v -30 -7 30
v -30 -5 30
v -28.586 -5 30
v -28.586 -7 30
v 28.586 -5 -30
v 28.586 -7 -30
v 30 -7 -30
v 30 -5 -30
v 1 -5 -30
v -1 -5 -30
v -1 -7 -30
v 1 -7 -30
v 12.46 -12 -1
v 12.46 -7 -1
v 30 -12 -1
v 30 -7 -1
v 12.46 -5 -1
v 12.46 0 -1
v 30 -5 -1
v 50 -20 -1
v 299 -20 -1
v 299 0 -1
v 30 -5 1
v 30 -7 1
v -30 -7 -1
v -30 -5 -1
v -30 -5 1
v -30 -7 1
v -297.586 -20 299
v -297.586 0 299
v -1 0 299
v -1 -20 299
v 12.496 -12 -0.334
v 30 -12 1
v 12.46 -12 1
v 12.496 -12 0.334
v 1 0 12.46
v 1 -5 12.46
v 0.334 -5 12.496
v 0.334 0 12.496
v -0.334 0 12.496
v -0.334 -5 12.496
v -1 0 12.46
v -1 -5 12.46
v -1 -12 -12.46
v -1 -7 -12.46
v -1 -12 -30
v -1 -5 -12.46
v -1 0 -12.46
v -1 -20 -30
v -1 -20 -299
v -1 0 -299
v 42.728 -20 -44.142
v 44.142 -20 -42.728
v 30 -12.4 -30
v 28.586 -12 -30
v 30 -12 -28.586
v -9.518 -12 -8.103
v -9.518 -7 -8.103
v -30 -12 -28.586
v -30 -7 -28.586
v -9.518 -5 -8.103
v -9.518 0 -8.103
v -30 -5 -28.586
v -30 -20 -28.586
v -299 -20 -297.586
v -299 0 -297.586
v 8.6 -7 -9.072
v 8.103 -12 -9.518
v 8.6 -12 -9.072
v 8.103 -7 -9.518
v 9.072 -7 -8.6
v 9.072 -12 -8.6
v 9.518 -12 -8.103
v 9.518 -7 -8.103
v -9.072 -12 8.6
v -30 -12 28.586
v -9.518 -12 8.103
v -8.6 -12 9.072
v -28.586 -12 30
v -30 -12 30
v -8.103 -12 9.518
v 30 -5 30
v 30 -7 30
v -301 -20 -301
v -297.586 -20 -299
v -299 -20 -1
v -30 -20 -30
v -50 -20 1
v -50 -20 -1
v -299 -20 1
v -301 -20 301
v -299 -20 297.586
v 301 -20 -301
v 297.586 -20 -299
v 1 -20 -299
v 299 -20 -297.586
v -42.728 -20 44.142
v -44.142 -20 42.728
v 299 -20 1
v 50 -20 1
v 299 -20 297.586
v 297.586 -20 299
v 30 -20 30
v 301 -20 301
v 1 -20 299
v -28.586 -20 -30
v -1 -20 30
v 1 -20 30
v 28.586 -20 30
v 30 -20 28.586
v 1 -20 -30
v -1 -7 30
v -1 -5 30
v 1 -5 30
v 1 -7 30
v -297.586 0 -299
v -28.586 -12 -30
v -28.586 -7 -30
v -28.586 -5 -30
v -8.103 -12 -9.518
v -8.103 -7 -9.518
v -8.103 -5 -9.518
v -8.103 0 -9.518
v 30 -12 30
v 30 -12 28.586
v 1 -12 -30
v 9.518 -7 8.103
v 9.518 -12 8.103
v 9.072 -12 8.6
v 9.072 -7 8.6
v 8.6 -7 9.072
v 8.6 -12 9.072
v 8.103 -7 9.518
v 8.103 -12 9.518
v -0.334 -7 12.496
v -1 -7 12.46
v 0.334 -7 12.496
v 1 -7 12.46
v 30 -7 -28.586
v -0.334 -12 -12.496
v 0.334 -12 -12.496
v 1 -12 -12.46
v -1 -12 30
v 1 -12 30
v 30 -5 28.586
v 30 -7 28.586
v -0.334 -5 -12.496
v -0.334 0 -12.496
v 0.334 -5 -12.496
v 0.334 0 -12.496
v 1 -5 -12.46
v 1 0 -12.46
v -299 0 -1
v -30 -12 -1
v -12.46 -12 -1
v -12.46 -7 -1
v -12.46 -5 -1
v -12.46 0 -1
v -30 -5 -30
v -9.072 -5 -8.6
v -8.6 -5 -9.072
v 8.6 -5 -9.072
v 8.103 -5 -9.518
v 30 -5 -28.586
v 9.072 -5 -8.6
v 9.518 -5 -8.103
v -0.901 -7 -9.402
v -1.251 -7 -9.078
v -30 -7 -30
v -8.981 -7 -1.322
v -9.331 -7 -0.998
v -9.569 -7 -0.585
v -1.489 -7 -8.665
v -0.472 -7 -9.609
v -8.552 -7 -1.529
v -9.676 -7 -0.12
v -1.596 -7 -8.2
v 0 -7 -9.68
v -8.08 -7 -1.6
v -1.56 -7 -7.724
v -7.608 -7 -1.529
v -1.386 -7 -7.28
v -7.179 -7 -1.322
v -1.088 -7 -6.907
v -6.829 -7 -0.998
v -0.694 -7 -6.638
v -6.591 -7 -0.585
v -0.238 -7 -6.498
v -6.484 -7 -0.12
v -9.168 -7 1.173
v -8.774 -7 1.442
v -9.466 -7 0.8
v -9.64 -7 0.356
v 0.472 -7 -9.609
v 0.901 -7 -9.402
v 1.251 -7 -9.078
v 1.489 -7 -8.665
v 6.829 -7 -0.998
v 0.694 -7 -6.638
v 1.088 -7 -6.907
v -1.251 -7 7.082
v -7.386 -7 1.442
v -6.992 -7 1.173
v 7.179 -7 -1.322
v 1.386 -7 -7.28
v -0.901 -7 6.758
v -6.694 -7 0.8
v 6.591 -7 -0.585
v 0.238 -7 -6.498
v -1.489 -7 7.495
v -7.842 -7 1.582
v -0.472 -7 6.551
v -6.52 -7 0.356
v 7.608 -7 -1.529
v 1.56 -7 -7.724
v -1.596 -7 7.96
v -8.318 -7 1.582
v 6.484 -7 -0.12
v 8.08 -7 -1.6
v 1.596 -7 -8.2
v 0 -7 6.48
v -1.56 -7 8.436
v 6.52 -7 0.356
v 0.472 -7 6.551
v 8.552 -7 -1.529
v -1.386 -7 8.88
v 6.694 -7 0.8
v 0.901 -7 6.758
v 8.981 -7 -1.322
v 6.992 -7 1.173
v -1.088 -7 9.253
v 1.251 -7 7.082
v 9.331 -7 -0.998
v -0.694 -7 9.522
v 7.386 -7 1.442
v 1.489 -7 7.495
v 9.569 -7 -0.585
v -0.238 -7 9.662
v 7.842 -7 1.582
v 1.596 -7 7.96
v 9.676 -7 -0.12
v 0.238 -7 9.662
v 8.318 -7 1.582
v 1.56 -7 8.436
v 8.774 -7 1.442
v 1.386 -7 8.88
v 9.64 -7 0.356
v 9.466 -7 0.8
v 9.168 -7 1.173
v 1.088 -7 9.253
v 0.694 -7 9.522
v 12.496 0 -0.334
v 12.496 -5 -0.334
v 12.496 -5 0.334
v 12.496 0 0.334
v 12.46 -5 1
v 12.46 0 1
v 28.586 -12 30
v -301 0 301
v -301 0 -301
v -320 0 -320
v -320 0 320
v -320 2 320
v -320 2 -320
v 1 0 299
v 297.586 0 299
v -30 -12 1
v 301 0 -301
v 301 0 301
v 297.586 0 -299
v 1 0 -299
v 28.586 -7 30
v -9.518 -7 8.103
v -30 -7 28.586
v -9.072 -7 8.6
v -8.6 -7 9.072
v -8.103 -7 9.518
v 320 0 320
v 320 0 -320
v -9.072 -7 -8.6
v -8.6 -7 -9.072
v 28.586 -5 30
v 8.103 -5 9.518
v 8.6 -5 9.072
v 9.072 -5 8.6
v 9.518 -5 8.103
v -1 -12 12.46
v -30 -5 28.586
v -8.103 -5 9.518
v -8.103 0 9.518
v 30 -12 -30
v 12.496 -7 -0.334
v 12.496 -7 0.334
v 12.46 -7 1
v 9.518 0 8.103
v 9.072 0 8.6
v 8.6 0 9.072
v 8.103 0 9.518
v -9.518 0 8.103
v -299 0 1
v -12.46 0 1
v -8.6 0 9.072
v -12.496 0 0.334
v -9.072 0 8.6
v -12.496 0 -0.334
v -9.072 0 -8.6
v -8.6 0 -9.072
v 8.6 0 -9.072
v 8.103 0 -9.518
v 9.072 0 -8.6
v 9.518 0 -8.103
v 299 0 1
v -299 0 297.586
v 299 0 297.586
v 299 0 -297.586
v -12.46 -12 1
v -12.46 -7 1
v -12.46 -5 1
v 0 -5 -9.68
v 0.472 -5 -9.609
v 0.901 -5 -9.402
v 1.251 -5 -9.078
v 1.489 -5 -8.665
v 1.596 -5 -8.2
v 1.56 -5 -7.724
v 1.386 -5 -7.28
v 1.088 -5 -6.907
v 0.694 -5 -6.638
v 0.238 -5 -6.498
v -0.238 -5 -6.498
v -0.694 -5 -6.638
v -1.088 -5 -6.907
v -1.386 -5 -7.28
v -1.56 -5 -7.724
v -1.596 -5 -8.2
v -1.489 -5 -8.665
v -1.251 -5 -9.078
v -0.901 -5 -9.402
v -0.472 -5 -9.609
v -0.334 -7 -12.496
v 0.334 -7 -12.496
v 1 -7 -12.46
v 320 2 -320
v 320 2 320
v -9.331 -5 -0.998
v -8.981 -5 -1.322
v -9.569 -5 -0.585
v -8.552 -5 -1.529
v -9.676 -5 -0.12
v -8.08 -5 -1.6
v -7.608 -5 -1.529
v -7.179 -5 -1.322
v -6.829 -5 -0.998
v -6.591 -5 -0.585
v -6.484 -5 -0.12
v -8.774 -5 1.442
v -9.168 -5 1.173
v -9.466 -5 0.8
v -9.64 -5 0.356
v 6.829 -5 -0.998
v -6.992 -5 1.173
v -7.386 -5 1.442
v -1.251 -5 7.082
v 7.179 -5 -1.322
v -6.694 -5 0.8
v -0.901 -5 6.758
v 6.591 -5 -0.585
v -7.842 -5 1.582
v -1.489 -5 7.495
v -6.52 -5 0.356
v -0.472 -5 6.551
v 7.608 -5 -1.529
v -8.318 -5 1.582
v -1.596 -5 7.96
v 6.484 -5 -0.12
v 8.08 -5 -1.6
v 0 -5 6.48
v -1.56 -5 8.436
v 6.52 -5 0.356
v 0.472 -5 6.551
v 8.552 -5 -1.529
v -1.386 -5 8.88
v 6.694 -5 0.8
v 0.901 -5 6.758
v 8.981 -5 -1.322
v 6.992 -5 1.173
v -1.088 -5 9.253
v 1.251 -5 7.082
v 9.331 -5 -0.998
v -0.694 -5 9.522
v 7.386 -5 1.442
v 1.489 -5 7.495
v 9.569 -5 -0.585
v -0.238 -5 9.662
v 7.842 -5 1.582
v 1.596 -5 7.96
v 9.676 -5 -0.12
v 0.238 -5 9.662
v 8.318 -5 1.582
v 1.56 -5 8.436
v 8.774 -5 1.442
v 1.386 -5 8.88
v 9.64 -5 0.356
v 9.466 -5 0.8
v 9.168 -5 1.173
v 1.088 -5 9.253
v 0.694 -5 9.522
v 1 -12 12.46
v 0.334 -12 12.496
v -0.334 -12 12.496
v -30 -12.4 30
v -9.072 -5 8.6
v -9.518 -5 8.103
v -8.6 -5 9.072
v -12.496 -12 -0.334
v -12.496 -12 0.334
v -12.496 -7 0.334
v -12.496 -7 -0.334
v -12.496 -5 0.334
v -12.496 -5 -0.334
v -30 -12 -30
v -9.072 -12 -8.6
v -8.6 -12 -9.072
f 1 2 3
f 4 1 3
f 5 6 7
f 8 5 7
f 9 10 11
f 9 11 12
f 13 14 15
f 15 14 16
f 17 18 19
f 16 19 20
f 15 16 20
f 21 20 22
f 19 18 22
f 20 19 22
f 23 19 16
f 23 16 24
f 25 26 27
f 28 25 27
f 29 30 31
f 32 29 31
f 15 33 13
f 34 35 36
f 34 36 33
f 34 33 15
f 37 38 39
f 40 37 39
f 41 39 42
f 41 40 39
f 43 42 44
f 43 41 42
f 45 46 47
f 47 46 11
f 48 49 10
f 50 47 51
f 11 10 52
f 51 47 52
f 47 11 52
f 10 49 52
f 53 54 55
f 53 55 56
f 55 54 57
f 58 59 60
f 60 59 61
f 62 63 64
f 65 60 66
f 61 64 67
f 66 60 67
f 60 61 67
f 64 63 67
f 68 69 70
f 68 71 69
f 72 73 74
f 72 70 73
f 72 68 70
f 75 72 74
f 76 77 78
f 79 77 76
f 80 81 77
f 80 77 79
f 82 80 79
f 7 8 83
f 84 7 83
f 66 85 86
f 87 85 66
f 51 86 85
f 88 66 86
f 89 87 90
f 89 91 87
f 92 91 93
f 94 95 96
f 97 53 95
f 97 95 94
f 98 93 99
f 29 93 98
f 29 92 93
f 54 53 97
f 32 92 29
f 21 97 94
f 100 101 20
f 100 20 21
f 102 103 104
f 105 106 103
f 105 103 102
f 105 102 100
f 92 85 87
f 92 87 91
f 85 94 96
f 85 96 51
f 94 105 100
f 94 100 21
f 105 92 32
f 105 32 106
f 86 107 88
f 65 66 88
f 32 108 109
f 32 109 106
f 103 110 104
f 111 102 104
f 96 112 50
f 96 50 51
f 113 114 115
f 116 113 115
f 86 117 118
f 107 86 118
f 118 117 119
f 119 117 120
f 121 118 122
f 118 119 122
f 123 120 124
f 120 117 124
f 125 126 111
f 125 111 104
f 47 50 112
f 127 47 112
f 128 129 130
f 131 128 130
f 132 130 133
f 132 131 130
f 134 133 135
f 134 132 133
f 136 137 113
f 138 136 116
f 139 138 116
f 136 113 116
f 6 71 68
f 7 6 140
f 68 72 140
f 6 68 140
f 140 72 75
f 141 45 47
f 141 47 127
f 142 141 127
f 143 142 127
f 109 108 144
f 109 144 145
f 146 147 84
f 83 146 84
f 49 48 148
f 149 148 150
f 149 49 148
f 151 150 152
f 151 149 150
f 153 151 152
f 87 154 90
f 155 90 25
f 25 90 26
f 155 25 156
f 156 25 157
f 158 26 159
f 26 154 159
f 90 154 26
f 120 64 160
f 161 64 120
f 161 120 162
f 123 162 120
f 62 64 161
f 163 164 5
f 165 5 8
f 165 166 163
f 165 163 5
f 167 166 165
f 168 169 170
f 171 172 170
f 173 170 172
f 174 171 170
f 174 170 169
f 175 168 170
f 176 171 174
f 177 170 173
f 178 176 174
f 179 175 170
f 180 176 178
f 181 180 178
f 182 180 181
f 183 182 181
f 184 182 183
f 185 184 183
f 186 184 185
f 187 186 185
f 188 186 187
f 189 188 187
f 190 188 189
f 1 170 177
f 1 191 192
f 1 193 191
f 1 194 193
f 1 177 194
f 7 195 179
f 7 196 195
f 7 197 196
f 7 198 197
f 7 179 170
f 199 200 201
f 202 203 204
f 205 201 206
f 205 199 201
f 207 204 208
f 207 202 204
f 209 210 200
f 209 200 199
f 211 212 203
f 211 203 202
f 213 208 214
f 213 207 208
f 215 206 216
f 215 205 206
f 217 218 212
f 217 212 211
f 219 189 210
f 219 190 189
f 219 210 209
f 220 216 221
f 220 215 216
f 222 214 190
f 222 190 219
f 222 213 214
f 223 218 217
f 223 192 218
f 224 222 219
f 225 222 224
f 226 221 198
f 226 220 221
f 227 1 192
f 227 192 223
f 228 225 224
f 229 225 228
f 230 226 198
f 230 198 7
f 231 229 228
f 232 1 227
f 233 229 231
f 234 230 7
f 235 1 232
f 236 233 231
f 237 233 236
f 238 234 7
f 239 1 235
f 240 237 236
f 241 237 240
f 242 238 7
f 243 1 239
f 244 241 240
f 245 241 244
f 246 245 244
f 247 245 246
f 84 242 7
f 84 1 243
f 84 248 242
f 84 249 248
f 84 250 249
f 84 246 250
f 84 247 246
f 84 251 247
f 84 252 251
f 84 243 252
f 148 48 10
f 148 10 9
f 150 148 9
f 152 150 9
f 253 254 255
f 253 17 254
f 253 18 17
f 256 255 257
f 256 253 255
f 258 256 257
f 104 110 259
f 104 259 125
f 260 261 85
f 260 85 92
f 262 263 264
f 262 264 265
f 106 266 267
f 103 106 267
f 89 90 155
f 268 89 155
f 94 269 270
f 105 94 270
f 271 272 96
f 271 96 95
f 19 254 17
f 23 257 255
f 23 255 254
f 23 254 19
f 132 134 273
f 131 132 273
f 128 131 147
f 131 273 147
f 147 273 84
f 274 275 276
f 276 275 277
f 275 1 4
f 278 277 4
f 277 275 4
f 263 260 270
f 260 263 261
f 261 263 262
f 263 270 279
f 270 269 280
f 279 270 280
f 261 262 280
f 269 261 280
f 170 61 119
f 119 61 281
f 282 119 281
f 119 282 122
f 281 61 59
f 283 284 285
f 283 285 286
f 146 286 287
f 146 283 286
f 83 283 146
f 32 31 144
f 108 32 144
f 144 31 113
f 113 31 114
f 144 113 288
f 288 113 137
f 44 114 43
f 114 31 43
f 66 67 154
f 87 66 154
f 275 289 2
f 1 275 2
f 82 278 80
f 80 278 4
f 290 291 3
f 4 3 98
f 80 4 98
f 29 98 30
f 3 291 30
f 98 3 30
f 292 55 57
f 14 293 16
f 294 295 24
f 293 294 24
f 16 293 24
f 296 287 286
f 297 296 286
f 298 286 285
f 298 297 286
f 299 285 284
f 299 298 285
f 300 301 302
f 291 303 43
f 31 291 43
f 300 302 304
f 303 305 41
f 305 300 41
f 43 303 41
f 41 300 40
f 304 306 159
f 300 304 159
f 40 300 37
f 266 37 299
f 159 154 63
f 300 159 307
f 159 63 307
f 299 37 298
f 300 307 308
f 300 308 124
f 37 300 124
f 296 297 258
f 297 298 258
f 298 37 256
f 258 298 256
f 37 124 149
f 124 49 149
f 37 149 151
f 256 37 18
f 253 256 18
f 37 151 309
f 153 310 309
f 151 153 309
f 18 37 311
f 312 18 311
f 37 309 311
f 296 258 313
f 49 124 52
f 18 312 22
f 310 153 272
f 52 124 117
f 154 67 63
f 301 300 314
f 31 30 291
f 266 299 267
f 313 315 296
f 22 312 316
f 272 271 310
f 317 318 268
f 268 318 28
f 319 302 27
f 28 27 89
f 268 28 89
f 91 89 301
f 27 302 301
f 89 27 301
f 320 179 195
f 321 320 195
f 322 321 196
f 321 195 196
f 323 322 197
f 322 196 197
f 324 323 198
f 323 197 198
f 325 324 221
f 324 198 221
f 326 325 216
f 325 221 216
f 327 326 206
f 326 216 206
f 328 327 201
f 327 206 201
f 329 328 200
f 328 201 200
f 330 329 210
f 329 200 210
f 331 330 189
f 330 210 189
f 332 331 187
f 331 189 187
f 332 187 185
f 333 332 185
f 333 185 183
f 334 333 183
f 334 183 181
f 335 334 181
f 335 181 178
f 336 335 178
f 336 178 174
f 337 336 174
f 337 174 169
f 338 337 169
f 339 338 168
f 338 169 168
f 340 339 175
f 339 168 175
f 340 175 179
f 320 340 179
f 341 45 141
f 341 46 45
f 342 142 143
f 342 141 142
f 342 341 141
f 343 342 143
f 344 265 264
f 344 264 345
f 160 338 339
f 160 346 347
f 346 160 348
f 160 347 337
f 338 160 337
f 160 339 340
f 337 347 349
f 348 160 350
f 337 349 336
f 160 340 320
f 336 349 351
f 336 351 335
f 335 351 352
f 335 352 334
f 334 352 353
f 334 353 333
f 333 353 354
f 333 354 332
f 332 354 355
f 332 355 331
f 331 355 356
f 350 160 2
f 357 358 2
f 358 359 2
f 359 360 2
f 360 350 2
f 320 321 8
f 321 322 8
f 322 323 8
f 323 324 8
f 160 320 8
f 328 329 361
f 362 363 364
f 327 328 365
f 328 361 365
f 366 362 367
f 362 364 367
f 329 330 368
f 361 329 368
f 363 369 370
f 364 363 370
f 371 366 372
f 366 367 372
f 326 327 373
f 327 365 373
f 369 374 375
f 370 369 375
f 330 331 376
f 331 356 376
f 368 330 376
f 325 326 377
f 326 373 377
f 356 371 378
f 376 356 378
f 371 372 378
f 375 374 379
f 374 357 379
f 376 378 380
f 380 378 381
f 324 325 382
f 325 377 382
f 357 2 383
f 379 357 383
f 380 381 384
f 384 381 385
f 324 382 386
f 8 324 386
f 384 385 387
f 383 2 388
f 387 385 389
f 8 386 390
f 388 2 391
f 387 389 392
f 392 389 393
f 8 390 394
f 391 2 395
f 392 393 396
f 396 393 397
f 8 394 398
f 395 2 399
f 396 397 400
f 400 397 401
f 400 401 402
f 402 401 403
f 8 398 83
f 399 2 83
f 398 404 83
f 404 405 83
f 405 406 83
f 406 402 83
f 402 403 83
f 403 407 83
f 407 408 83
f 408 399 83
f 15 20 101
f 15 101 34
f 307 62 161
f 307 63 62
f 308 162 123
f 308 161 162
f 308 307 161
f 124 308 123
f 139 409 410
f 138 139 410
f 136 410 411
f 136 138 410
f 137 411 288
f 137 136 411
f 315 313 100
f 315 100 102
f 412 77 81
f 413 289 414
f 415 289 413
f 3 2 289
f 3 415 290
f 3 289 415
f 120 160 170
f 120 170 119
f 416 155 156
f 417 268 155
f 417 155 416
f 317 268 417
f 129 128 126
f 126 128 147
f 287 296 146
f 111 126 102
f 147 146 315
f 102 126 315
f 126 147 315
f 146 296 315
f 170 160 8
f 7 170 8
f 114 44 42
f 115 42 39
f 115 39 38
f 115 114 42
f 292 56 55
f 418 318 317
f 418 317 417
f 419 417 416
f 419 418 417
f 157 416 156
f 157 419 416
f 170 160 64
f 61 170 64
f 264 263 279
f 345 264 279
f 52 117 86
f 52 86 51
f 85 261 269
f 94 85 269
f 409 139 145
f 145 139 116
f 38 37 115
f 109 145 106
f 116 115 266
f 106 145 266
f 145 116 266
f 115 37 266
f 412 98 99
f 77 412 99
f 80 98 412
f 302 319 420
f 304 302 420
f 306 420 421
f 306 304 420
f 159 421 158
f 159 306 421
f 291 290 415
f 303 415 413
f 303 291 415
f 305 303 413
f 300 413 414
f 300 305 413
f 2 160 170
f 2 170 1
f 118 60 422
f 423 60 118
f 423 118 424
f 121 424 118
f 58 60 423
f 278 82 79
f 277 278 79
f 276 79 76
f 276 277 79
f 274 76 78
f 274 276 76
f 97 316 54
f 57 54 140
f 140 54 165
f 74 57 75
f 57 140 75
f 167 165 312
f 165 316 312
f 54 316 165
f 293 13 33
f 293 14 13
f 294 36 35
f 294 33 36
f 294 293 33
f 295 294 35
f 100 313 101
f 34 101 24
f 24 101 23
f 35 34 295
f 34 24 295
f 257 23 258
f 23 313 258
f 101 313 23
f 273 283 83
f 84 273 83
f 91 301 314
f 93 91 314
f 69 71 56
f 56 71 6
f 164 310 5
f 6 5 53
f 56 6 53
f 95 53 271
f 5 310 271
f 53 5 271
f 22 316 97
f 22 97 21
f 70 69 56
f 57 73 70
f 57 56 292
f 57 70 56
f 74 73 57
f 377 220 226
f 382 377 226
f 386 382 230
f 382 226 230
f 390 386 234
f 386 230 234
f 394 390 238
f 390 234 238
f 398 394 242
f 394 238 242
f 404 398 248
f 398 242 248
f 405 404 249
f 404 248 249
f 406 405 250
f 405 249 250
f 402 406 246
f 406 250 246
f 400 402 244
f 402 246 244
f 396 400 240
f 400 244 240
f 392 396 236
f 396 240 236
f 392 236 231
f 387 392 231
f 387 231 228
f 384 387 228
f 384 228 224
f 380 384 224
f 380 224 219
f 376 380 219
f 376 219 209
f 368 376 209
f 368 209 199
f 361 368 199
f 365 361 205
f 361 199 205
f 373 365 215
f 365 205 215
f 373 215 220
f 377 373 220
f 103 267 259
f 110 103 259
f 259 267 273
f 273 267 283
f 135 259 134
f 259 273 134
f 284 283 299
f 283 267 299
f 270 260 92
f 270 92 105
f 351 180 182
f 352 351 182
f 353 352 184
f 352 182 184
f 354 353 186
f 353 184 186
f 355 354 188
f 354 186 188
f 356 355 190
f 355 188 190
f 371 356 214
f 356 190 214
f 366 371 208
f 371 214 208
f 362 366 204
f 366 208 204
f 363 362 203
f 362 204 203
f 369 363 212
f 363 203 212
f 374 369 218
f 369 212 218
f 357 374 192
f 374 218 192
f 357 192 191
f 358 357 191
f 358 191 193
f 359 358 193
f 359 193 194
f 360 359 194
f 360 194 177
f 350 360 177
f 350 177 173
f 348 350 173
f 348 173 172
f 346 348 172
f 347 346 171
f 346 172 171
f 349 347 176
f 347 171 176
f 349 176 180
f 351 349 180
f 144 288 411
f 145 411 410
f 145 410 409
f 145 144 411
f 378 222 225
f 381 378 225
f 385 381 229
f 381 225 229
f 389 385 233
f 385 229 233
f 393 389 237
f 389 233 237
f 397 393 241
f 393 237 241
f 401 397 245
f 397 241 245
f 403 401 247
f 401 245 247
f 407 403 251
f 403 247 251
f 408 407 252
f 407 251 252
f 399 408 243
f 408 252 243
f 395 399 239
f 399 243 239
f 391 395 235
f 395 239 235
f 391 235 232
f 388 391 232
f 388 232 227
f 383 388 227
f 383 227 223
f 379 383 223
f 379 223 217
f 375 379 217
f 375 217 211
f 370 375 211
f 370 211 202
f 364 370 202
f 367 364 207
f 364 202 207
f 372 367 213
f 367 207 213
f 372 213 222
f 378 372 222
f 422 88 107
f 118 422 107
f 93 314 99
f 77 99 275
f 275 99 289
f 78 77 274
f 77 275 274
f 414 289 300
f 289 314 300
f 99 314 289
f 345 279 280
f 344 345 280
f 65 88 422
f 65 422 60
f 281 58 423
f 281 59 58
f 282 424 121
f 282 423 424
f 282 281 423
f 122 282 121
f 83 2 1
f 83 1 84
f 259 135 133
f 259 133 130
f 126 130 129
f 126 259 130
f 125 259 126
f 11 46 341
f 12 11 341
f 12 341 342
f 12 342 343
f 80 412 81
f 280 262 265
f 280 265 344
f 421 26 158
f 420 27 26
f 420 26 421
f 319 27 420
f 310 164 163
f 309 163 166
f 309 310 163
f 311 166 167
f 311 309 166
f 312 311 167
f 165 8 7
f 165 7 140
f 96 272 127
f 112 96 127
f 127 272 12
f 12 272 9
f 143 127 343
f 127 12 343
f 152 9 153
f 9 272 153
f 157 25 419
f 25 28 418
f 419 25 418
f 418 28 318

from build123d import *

# Parameters (mm, degrees)
SKETCH_1_W          = 640
SKETCH_1_H          = 640
EXTRUDE_1_DEPTH     = 2
SKETCH_2_W          = 602
SKETCH_2_H          = 602
SKETCH_2_W_2        = 598
SKETCH_2_H_2        = 598
EXTRUDE_2_DEPTH     = 20
SKETCH_4_R          = 12.5
CUT_EXTRUDE_1_DEPTH = 453.990066116
CUT_EXTRUDE_START   = 5
SKETCH_3_W          = 60
SKETCH_3_H          = 60
CUT_EXTRUDE_2_DEPTH = 2
EXTRUDE_START       = 5
SKETCH_3_2_W        = 60
SKETCH_3_2_H        = 60
EXTRUDE_3_DEPTH     = 2
SKETCH_5_R          = 1.6
CUT_EXTRUDE_3_DEPTH = 2
CUT_EXTRUDE_START_2 = 20
SKETCH_3_3_W        = 60
SKETCH_3_3_H        = 60
CUT_EXTRUDE_4_DEPTH = 8
CUT_EXTRUDE_5_DEPTH = 2
CUT_EXTRUDE_6_REACH = 455.989


with BuildPart() as part:
    # 草图1 → 凸台-拉伸1 (new body)
    with BuildSketch(Plane(origin=(0, 0, 0), x_dir=(1, 0, 0), z_dir=(0, 1, 0))):
        Rectangle(SKETCH_1_W, SKETCH_1_H)
    extrude(amount=EXTRUDE_1_DEPTH)

    # 草图2 → 凸台-拉伸2 (add)
    # profile 1 of 6: a face of its own
    with BuildSketch(Plane.XZ):
        Rectangle(SKETCH_2_W, SKETCH_2_H)
        Rectangle(SKETCH_2_W_2, SKETCH_2_H_2, mode=Mode.SUBTRACT)
    # profile 2 of 6: a face of its own
    with BuildSketch(Plane.XZ):
        Polygon((299, -297.585786438), (2.414213562, -1), (1, -1), (1, -2.414213562), (297.585786438, -299), (299, -299), align=None)
    # profile 3 of 6: a face of its own
    with BuildSketch(Plane.XZ):
        Polygon((-1, 2.414213562), (-297.585786438, 299), (-299, 299), (-299, 297.585786438), (-2.414213562, 1), (-1, 1), align=None)
    # profile 4 of 6: a face of its own
    with BuildSketch(Plane.XZ):
        Polygon((299, 1), (2.414213562, 1), (1, 1), (1, 2.414213562), (1, 299), (-1, 299), (-1, 2.414213562), (-1, 1), (-2.414213562, 1), (-299, 1), (-299, -1), (-2.414213562, -1), (-1, -1), (-1, -2.414213562), (-1, -299), (1, -299), (1, -2.414213562), (1, -1), (2.414213562, -1), (299, -1), align=None)
    # profile 5 of 6: a face of its own
    with BuildSketch(Plane.XZ):
        Polygon((2.414213562, 1), (299, 297.585786438), (299, 299), (297.585786438, 299), (1, 2.414213562), (1, 1), align=None)
    # profile 6 of 6: a face of its own
    with BuildSketch(Plane.XZ):
        Polygon((-297.585786438, -299), (-1, -2.414213562), (-1, -1), (-2.414213562, -1), (-299, -297.585786438), (-299, -299), align=None)
    extrude(amount=EXTRUDE_2_DEPTH)

    # 草图4 → 切除-拉伸1 (cut, through all)
    with BuildSketch(Plane.XZ):
        Circle(SKETCH_4_R)
    extrude(amount=CUT_EXTRUDE_1_DEPTH, mode=Mode.SUBTRACT)

    # 草图3 → 切除-拉伸2 (cut)
    with BuildSketch(Plane.XZ.offset(CUT_EXTRUDE_START)):
        Rectangle(SKETCH_3_W, SKETCH_3_H)
    extrude(amount=CUT_EXTRUDE_2_DEPTH, mode=Mode.SUBTRACT)

    # 草图3<3> → 切除-拉伸4 (cut)
    with BuildSketch(Plane.XZ.offset(CUT_EXTRUDE_START_2)):
        Rectangle(SKETCH_3_3_W, SKETCH_3_3_H)
    extrude(amount=-CUT_EXTRUDE_4_DEPTH, mode=Mode.SUBTRACT)

    # 草图7 → 切除-拉伸5 (cut)
    with BuildSketch(Plane(origin=(0, 0, -1), x_dir=(-1, 0, 0), z_dir=(0, 0, -1))):
        Polygon((-30, -12), (-30, -20), (-50, -20), align=None)
        Polygon((50, -20), (30, -12), (30, -20), align=None)
    extrude(amount=-CUT_EXTRUDE_5_DEPTH, mode=Mode.SUBTRACT)

    # 切除-拉伸6: up to this face of the body (flat: up to its plane)
    cut_extrude_6_end = Plane(part.part.faces().sort_by_distance((-159.191604646, -9.853299667, 157.777391083))[0])
    # 草图8 → 切除-拉伸6 (cut, up to the picked face)
    with BuildSketch(Plane(origin=(0.7071067811864107, 0, 0.7071067811864109), x_dir=(0.7071067811865476, 0, -0.7071067811865476), z_dir=(0.7071067811865476, 0, 0.7071067811865476)), mode=Mode.PRIVATE) as cut_extrude_6_sk1:
        Polygon((-41.426406871, -12), (-41.426406871, -20), (-61.426406871, -20), align=None)
    cut_extrude_6_tool1 = split(extrude(cut_extrude_6_sk1.sketch, amount=-CUT_EXTRUDE_6_REACH, mode=Mode.PRIVATE), bisect_by=cut_extrude_6_end, keep=Keep.BOTH, mode=Mode.PRIVATE)
    # 草图8 → 切除-拉伸6 (cut, up to the picked face)
    with BuildSketch(Plane(origin=(0.7071067811864107, 0, 0.7071067811864109), x_dir=(0.7071067811865476, 0, -0.7071067811865476), z_dir=(0.7071067811865476, 0, 0.7071067811865476)), mode=Mode.PRIVATE) as cut_extrude_6_sk2:
        Polygon((61.426406871, -20), (41.426406871, -12), (41.426406871, -20), align=None)
    cut_extrude_6_tool2 = split(extrude(cut_extrude_6_sk2.sketch, amount=-CUT_EXTRUDE_6_REACH, mode=Mode.PRIVATE), bisect_by=cut_extrude_6_end, keep=Keep.BOTH, mode=Mode.PRIVATE)
    add(cut_extrude_6_tool1.solids().sort_by(Axis((-33.299832, -17.333333, 34.714045), (-0.7071067811865476, 0, -0.7071067811865476)))[0], mode=Mode.SUBTRACT)
    add(cut_extrude_6_tool2.solids().sort_by(Axis((34.714045, -17.333333, -33.299832), (-0.7071067811865476, 0, -0.7071067811865476)))[0], mode=Mode.SUBTRACT)


with BuildPart() as body_2:
    # 草图3<2> → 凸台-拉伸3 (new body)
    with BuildSketch(Plane.XZ.offset(EXTRUDE_START)):
        Rectangle(SKETCH_3_2_W, SKETCH_3_2_H)
    extrude(amount=EXTRUDE_3_DEPTH)

    # 草图5 → 切除-拉伸3 (cut)
    with BuildSketch(Plane.XZ.offset(7)):
        with Locations(Location((8.08, 0, 0), (0, 0, 270))):
            Circle(SKETCH_5_R)
        with Locations(Location((0, -8.08, 0), (0, 0, 270))):
            Circle(SKETCH_5_R)
        with Locations(Location((-8.08, 0, 0), (0, 0, 270))):
            Circle(SKETCH_5_R)
        with Locations(Location((0, 8.08, 0), (0, 0, 270))):
            Circle(SKETCH_5_R)
    extrude(amount=-CUT_EXTRUDE_3_DEPTH, mode=Mode.SUBTRACT)


solid = Compound([part.part, body_2.part])
